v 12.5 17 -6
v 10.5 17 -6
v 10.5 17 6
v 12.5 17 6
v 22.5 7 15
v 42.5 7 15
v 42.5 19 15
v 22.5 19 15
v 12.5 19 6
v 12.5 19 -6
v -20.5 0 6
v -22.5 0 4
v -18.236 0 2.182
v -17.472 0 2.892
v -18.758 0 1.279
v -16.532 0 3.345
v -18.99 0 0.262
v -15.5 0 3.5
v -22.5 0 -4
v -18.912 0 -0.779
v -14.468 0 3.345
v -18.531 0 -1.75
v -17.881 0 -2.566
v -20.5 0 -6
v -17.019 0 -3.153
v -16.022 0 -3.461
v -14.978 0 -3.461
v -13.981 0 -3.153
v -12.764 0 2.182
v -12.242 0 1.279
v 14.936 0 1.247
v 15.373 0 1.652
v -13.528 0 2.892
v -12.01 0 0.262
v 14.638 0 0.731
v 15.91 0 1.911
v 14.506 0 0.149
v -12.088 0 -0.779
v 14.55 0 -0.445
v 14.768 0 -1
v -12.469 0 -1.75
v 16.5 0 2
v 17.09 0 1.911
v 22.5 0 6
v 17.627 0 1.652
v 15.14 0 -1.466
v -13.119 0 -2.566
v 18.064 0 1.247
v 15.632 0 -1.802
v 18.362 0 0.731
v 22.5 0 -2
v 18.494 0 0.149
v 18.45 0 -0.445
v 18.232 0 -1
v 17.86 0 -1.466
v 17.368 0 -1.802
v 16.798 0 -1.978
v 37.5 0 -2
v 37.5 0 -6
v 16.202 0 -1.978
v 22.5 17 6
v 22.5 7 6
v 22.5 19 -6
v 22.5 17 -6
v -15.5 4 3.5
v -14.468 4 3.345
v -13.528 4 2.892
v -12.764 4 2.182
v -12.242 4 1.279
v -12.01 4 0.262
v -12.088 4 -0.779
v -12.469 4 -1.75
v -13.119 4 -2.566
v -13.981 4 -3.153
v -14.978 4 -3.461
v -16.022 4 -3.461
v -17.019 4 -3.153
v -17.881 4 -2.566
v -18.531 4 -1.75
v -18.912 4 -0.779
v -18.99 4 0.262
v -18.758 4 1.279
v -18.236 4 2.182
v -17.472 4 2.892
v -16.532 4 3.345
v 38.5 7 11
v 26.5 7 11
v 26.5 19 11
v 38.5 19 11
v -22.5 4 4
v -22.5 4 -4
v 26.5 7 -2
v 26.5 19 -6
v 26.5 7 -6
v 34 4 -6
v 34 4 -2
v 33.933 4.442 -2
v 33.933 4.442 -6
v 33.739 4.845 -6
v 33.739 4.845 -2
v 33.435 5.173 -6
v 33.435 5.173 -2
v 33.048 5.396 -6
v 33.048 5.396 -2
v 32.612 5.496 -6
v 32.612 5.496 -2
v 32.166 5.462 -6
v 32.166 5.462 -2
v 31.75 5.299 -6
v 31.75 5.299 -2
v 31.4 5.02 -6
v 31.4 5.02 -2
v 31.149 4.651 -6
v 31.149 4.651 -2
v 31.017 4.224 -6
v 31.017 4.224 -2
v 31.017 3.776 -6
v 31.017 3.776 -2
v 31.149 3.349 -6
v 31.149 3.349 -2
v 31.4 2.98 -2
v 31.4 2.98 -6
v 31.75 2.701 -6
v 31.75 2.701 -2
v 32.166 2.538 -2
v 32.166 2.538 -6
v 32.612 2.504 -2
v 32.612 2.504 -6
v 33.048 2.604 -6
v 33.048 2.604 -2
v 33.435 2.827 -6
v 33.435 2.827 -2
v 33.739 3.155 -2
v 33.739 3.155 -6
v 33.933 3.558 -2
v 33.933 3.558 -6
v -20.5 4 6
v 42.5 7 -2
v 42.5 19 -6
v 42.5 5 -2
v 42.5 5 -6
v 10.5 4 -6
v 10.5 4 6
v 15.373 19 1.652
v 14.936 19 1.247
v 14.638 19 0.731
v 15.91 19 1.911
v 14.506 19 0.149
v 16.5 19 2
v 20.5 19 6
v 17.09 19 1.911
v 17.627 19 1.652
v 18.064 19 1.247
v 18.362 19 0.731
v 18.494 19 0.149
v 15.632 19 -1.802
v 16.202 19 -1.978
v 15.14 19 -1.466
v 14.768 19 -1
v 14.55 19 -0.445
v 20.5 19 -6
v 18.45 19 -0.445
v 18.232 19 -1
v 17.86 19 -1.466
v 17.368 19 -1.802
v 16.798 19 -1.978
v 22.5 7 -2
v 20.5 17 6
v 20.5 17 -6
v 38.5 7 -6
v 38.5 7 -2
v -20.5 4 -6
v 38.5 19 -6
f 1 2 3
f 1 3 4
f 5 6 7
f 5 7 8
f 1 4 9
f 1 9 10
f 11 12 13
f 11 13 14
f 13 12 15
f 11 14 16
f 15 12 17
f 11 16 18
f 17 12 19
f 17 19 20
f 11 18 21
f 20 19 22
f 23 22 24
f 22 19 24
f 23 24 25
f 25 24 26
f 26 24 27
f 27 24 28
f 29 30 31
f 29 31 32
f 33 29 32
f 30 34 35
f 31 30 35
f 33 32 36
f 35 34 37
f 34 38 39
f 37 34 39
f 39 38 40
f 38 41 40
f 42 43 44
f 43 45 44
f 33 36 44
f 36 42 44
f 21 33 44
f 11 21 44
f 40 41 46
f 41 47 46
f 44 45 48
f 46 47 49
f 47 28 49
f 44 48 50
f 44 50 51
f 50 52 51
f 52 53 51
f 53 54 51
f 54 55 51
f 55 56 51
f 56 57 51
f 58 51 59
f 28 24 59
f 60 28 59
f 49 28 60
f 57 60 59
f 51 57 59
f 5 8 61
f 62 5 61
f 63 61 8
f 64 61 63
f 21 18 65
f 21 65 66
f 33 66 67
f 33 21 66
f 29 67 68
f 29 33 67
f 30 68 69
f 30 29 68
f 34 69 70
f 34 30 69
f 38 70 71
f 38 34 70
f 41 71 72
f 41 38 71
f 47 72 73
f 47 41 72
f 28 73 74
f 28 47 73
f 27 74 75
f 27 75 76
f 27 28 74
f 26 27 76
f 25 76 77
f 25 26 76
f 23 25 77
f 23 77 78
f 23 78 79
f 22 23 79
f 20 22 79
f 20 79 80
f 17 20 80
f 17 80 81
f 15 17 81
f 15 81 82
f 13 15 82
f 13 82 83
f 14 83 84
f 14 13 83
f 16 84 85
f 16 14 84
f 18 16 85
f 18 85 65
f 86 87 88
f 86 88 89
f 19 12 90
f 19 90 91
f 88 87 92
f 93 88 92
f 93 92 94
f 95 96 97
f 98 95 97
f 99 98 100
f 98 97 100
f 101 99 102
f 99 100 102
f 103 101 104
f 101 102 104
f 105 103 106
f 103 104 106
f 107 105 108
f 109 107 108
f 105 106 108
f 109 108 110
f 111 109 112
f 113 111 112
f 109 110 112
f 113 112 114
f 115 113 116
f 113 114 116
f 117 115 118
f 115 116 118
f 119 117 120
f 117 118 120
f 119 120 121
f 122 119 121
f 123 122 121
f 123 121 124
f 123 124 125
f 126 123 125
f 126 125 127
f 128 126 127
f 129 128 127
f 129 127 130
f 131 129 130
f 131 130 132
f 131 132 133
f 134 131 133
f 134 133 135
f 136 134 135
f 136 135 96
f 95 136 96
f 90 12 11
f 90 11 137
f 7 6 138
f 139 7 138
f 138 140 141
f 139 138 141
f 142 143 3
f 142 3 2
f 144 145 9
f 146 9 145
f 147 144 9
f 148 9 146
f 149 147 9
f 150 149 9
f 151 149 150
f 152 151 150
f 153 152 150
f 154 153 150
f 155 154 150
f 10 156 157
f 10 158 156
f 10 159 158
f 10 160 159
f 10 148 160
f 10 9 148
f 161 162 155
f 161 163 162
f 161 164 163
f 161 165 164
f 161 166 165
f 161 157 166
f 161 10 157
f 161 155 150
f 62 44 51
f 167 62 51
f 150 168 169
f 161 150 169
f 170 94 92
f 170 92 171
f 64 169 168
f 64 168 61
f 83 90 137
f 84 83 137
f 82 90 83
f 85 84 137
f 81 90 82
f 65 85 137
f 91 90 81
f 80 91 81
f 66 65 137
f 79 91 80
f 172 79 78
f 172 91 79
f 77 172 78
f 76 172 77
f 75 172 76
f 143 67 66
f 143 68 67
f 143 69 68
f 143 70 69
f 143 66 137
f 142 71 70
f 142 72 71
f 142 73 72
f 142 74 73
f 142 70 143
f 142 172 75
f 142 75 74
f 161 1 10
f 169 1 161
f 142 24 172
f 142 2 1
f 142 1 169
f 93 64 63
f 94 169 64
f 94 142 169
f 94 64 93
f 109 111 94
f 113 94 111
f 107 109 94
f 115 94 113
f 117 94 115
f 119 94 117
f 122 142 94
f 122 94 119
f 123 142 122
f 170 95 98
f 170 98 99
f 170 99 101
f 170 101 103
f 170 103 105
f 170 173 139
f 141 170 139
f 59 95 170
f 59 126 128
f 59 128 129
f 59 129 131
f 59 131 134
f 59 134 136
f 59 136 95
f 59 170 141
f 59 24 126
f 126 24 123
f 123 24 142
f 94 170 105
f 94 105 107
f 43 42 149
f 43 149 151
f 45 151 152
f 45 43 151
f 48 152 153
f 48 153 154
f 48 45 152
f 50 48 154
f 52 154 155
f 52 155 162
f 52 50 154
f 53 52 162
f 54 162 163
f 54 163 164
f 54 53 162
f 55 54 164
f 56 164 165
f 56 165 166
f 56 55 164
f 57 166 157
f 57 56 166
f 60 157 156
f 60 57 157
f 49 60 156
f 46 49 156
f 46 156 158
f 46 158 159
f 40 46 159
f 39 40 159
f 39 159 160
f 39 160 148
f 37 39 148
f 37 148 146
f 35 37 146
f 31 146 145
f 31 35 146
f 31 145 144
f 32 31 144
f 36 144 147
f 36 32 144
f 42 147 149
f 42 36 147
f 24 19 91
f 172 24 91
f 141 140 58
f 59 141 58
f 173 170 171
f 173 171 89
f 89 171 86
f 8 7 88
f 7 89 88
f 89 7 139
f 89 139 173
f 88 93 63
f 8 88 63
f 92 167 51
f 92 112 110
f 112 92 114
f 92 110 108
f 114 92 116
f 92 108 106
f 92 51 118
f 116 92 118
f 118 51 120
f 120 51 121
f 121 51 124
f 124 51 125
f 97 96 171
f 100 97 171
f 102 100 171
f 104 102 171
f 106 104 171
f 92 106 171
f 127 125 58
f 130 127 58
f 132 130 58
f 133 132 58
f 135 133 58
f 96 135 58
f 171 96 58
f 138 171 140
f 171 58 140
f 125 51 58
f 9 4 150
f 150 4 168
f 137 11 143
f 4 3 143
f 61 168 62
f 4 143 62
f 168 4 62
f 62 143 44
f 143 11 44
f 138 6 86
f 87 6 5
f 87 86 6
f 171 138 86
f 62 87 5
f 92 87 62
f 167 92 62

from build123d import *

# Parameters (mm, degrees)
SKETCH1_W           = 33
SKETCH1_H           = 12
SKETCH1_R           = 3.5
BOSS_EXTRUDE1_DEPTH = 4
SKETCH1_4_W         = 2
SKETCH1_4_H         = 12
BOSS_EXTRUDE2_DEPTH = 17
SKETCH1_5_W         = 8
SKETCH1_5_H         = 12
SKETCH1_5_R         = 2
BOSS_EXTRUDE3_DEPTH = 19
SKETCH1_6_W         = 20
SKETCH1_6_H         = 4
BOSS_EXTRUDE4_DEPTH = 7
BOSS_EXTRUDE5_DEPTH = 12
CHAMFER1_SIZE       = 2
SKETCH3_R           = 1.5
CUT_EXTRUDE1_DEPTH  = 50.560569004


with BuildPart() as part:
    # Sketch1 → Boss-Extrude1 (new body)
    with BuildSketch(Plane(origin=(0, 0, 0), x_dir=(1, 0, 0), z_dir=(0, 1, 0))):
        with Locations((-6, 0)):
            Rectangle(SKETCH1_W, SKETCH1_H)
        with Locations(Location((-15.5, 0, 0), (0, 0, 270))):
            Circle(SKETCH1_R, mode=Mode.SUBTRACT)
    extrude(amount=BOSS_EXTRUDE1_DEPTH)

    # Sketch1<4> → Boss-Extrude2 (add)
    with BuildSketch(Plane(origin=(0, 0, 0), x_dir=(1, 0, 0), z_dir=(0, 1, 0))):
        with Locations((11.5, 0)):
            Rectangle(SKETCH1_4_W, SKETCH1_4_H)
        Polygon((22.5, 6), (20.5, 6), (20.5, -6), (22.5, -6), (22.5, 2), align=None)
    extrude(amount=BOSS_EXTRUDE2_DEPTH)


with BuildPart() as boss_extrude2_piece_1:
    # of the separate pieces the step leaves, piece 1, a body of its own (boss_extrude2_pieces)
    add(part.part.solids().sort_by_distance((-22.5, 0, -6))[0])



with BuildPart() as boss_extrude2_piece_2:
    # of the separate pieces the step leaves, piece 2, a body of its own (boss_extrude2_pieces)
    add(part.part.solids().sort_by_distance((20.5, 0, 6))[0])


with BuildPart() as boss_extrude2_piece_1_1:
    add(boss_extrude2_piece_1.part)

    add(boss_extrude2_piece_2.part)  # Boss-Extrude3 merges Boss-Extrude2 piece 2
    # Sketch1<5> → Boss-Extrude3 (add)
    with BuildSketch(Plane(origin=(0, 0, 0), x_dir=(1, 0, 0), z_dir=(0, 1, 0))):
        with Locations((16.5, 0)):
            Rectangle(SKETCH1_5_W, SKETCH1_5_H)
        with Locations(Location((16.5, 0, 0), (0, 0, 270))):
            Circle(SKETCH1_5_R, mode=Mode.SUBTRACT)
    extrude(amount=BOSS_EXTRUDE3_DEPTH)

    # Sketch1<6> → Boss-Extrude4 (add)
    with BuildSketch(Plane(origin=(0, 0, 0), x_dir=(1, 0, 0), z_dir=(0, 1, 0))):
        with Locations((32.5, 4)):
            Rectangle(SKETCH1_6_W, SKETCH1_6_H)
    extrude(amount=BOSS_EXTRUDE4_DEPTH)

    # Sketch2 → Boss-Extrude5 (add)
    with BuildSketch(Plane(origin=(0, 7, 0), x_dir=(1, 0, 0), z_dir=(0, 1, 0))):
        Polygon((22.5, 6), (26.5, 6), (26.5, 2), (26.5, -11), (38.5, -11), (38.5, 2), (38.5, 6), (42.5, 6), (42.5, -15), (22.5, -15), align=None)
    extrude(amount=BOSS_EXTRUDE5_DEPTH)

    # Chamfer1
    chamfer1_edges = [boss_extrude2_piece_1_1.edges().sort_by_distance(p)[0] for p in [
        (-22.5, 2, 6),
        (-22.5, 2, -6),
    ]]
    chamfer(chamfer1_edges, length=CHAMFER1_SIZE)

    # Sketch3 → Cut-Extrude1 (cut, through all)
    with BuildSketch(Plane.XY.offset(-2)):
        with Locations((32.5, 4)):
            Circle(SKETCH3_R)
        Polygon((42.5, 0), (42.5, 5), (37.5, 0), align=None)
    extrude(amount=-CUT_EXTRUDE1_DEPTH, mode=Mode.SUBTRACT)


solid = boss_extrude2_piece_1_1.part
